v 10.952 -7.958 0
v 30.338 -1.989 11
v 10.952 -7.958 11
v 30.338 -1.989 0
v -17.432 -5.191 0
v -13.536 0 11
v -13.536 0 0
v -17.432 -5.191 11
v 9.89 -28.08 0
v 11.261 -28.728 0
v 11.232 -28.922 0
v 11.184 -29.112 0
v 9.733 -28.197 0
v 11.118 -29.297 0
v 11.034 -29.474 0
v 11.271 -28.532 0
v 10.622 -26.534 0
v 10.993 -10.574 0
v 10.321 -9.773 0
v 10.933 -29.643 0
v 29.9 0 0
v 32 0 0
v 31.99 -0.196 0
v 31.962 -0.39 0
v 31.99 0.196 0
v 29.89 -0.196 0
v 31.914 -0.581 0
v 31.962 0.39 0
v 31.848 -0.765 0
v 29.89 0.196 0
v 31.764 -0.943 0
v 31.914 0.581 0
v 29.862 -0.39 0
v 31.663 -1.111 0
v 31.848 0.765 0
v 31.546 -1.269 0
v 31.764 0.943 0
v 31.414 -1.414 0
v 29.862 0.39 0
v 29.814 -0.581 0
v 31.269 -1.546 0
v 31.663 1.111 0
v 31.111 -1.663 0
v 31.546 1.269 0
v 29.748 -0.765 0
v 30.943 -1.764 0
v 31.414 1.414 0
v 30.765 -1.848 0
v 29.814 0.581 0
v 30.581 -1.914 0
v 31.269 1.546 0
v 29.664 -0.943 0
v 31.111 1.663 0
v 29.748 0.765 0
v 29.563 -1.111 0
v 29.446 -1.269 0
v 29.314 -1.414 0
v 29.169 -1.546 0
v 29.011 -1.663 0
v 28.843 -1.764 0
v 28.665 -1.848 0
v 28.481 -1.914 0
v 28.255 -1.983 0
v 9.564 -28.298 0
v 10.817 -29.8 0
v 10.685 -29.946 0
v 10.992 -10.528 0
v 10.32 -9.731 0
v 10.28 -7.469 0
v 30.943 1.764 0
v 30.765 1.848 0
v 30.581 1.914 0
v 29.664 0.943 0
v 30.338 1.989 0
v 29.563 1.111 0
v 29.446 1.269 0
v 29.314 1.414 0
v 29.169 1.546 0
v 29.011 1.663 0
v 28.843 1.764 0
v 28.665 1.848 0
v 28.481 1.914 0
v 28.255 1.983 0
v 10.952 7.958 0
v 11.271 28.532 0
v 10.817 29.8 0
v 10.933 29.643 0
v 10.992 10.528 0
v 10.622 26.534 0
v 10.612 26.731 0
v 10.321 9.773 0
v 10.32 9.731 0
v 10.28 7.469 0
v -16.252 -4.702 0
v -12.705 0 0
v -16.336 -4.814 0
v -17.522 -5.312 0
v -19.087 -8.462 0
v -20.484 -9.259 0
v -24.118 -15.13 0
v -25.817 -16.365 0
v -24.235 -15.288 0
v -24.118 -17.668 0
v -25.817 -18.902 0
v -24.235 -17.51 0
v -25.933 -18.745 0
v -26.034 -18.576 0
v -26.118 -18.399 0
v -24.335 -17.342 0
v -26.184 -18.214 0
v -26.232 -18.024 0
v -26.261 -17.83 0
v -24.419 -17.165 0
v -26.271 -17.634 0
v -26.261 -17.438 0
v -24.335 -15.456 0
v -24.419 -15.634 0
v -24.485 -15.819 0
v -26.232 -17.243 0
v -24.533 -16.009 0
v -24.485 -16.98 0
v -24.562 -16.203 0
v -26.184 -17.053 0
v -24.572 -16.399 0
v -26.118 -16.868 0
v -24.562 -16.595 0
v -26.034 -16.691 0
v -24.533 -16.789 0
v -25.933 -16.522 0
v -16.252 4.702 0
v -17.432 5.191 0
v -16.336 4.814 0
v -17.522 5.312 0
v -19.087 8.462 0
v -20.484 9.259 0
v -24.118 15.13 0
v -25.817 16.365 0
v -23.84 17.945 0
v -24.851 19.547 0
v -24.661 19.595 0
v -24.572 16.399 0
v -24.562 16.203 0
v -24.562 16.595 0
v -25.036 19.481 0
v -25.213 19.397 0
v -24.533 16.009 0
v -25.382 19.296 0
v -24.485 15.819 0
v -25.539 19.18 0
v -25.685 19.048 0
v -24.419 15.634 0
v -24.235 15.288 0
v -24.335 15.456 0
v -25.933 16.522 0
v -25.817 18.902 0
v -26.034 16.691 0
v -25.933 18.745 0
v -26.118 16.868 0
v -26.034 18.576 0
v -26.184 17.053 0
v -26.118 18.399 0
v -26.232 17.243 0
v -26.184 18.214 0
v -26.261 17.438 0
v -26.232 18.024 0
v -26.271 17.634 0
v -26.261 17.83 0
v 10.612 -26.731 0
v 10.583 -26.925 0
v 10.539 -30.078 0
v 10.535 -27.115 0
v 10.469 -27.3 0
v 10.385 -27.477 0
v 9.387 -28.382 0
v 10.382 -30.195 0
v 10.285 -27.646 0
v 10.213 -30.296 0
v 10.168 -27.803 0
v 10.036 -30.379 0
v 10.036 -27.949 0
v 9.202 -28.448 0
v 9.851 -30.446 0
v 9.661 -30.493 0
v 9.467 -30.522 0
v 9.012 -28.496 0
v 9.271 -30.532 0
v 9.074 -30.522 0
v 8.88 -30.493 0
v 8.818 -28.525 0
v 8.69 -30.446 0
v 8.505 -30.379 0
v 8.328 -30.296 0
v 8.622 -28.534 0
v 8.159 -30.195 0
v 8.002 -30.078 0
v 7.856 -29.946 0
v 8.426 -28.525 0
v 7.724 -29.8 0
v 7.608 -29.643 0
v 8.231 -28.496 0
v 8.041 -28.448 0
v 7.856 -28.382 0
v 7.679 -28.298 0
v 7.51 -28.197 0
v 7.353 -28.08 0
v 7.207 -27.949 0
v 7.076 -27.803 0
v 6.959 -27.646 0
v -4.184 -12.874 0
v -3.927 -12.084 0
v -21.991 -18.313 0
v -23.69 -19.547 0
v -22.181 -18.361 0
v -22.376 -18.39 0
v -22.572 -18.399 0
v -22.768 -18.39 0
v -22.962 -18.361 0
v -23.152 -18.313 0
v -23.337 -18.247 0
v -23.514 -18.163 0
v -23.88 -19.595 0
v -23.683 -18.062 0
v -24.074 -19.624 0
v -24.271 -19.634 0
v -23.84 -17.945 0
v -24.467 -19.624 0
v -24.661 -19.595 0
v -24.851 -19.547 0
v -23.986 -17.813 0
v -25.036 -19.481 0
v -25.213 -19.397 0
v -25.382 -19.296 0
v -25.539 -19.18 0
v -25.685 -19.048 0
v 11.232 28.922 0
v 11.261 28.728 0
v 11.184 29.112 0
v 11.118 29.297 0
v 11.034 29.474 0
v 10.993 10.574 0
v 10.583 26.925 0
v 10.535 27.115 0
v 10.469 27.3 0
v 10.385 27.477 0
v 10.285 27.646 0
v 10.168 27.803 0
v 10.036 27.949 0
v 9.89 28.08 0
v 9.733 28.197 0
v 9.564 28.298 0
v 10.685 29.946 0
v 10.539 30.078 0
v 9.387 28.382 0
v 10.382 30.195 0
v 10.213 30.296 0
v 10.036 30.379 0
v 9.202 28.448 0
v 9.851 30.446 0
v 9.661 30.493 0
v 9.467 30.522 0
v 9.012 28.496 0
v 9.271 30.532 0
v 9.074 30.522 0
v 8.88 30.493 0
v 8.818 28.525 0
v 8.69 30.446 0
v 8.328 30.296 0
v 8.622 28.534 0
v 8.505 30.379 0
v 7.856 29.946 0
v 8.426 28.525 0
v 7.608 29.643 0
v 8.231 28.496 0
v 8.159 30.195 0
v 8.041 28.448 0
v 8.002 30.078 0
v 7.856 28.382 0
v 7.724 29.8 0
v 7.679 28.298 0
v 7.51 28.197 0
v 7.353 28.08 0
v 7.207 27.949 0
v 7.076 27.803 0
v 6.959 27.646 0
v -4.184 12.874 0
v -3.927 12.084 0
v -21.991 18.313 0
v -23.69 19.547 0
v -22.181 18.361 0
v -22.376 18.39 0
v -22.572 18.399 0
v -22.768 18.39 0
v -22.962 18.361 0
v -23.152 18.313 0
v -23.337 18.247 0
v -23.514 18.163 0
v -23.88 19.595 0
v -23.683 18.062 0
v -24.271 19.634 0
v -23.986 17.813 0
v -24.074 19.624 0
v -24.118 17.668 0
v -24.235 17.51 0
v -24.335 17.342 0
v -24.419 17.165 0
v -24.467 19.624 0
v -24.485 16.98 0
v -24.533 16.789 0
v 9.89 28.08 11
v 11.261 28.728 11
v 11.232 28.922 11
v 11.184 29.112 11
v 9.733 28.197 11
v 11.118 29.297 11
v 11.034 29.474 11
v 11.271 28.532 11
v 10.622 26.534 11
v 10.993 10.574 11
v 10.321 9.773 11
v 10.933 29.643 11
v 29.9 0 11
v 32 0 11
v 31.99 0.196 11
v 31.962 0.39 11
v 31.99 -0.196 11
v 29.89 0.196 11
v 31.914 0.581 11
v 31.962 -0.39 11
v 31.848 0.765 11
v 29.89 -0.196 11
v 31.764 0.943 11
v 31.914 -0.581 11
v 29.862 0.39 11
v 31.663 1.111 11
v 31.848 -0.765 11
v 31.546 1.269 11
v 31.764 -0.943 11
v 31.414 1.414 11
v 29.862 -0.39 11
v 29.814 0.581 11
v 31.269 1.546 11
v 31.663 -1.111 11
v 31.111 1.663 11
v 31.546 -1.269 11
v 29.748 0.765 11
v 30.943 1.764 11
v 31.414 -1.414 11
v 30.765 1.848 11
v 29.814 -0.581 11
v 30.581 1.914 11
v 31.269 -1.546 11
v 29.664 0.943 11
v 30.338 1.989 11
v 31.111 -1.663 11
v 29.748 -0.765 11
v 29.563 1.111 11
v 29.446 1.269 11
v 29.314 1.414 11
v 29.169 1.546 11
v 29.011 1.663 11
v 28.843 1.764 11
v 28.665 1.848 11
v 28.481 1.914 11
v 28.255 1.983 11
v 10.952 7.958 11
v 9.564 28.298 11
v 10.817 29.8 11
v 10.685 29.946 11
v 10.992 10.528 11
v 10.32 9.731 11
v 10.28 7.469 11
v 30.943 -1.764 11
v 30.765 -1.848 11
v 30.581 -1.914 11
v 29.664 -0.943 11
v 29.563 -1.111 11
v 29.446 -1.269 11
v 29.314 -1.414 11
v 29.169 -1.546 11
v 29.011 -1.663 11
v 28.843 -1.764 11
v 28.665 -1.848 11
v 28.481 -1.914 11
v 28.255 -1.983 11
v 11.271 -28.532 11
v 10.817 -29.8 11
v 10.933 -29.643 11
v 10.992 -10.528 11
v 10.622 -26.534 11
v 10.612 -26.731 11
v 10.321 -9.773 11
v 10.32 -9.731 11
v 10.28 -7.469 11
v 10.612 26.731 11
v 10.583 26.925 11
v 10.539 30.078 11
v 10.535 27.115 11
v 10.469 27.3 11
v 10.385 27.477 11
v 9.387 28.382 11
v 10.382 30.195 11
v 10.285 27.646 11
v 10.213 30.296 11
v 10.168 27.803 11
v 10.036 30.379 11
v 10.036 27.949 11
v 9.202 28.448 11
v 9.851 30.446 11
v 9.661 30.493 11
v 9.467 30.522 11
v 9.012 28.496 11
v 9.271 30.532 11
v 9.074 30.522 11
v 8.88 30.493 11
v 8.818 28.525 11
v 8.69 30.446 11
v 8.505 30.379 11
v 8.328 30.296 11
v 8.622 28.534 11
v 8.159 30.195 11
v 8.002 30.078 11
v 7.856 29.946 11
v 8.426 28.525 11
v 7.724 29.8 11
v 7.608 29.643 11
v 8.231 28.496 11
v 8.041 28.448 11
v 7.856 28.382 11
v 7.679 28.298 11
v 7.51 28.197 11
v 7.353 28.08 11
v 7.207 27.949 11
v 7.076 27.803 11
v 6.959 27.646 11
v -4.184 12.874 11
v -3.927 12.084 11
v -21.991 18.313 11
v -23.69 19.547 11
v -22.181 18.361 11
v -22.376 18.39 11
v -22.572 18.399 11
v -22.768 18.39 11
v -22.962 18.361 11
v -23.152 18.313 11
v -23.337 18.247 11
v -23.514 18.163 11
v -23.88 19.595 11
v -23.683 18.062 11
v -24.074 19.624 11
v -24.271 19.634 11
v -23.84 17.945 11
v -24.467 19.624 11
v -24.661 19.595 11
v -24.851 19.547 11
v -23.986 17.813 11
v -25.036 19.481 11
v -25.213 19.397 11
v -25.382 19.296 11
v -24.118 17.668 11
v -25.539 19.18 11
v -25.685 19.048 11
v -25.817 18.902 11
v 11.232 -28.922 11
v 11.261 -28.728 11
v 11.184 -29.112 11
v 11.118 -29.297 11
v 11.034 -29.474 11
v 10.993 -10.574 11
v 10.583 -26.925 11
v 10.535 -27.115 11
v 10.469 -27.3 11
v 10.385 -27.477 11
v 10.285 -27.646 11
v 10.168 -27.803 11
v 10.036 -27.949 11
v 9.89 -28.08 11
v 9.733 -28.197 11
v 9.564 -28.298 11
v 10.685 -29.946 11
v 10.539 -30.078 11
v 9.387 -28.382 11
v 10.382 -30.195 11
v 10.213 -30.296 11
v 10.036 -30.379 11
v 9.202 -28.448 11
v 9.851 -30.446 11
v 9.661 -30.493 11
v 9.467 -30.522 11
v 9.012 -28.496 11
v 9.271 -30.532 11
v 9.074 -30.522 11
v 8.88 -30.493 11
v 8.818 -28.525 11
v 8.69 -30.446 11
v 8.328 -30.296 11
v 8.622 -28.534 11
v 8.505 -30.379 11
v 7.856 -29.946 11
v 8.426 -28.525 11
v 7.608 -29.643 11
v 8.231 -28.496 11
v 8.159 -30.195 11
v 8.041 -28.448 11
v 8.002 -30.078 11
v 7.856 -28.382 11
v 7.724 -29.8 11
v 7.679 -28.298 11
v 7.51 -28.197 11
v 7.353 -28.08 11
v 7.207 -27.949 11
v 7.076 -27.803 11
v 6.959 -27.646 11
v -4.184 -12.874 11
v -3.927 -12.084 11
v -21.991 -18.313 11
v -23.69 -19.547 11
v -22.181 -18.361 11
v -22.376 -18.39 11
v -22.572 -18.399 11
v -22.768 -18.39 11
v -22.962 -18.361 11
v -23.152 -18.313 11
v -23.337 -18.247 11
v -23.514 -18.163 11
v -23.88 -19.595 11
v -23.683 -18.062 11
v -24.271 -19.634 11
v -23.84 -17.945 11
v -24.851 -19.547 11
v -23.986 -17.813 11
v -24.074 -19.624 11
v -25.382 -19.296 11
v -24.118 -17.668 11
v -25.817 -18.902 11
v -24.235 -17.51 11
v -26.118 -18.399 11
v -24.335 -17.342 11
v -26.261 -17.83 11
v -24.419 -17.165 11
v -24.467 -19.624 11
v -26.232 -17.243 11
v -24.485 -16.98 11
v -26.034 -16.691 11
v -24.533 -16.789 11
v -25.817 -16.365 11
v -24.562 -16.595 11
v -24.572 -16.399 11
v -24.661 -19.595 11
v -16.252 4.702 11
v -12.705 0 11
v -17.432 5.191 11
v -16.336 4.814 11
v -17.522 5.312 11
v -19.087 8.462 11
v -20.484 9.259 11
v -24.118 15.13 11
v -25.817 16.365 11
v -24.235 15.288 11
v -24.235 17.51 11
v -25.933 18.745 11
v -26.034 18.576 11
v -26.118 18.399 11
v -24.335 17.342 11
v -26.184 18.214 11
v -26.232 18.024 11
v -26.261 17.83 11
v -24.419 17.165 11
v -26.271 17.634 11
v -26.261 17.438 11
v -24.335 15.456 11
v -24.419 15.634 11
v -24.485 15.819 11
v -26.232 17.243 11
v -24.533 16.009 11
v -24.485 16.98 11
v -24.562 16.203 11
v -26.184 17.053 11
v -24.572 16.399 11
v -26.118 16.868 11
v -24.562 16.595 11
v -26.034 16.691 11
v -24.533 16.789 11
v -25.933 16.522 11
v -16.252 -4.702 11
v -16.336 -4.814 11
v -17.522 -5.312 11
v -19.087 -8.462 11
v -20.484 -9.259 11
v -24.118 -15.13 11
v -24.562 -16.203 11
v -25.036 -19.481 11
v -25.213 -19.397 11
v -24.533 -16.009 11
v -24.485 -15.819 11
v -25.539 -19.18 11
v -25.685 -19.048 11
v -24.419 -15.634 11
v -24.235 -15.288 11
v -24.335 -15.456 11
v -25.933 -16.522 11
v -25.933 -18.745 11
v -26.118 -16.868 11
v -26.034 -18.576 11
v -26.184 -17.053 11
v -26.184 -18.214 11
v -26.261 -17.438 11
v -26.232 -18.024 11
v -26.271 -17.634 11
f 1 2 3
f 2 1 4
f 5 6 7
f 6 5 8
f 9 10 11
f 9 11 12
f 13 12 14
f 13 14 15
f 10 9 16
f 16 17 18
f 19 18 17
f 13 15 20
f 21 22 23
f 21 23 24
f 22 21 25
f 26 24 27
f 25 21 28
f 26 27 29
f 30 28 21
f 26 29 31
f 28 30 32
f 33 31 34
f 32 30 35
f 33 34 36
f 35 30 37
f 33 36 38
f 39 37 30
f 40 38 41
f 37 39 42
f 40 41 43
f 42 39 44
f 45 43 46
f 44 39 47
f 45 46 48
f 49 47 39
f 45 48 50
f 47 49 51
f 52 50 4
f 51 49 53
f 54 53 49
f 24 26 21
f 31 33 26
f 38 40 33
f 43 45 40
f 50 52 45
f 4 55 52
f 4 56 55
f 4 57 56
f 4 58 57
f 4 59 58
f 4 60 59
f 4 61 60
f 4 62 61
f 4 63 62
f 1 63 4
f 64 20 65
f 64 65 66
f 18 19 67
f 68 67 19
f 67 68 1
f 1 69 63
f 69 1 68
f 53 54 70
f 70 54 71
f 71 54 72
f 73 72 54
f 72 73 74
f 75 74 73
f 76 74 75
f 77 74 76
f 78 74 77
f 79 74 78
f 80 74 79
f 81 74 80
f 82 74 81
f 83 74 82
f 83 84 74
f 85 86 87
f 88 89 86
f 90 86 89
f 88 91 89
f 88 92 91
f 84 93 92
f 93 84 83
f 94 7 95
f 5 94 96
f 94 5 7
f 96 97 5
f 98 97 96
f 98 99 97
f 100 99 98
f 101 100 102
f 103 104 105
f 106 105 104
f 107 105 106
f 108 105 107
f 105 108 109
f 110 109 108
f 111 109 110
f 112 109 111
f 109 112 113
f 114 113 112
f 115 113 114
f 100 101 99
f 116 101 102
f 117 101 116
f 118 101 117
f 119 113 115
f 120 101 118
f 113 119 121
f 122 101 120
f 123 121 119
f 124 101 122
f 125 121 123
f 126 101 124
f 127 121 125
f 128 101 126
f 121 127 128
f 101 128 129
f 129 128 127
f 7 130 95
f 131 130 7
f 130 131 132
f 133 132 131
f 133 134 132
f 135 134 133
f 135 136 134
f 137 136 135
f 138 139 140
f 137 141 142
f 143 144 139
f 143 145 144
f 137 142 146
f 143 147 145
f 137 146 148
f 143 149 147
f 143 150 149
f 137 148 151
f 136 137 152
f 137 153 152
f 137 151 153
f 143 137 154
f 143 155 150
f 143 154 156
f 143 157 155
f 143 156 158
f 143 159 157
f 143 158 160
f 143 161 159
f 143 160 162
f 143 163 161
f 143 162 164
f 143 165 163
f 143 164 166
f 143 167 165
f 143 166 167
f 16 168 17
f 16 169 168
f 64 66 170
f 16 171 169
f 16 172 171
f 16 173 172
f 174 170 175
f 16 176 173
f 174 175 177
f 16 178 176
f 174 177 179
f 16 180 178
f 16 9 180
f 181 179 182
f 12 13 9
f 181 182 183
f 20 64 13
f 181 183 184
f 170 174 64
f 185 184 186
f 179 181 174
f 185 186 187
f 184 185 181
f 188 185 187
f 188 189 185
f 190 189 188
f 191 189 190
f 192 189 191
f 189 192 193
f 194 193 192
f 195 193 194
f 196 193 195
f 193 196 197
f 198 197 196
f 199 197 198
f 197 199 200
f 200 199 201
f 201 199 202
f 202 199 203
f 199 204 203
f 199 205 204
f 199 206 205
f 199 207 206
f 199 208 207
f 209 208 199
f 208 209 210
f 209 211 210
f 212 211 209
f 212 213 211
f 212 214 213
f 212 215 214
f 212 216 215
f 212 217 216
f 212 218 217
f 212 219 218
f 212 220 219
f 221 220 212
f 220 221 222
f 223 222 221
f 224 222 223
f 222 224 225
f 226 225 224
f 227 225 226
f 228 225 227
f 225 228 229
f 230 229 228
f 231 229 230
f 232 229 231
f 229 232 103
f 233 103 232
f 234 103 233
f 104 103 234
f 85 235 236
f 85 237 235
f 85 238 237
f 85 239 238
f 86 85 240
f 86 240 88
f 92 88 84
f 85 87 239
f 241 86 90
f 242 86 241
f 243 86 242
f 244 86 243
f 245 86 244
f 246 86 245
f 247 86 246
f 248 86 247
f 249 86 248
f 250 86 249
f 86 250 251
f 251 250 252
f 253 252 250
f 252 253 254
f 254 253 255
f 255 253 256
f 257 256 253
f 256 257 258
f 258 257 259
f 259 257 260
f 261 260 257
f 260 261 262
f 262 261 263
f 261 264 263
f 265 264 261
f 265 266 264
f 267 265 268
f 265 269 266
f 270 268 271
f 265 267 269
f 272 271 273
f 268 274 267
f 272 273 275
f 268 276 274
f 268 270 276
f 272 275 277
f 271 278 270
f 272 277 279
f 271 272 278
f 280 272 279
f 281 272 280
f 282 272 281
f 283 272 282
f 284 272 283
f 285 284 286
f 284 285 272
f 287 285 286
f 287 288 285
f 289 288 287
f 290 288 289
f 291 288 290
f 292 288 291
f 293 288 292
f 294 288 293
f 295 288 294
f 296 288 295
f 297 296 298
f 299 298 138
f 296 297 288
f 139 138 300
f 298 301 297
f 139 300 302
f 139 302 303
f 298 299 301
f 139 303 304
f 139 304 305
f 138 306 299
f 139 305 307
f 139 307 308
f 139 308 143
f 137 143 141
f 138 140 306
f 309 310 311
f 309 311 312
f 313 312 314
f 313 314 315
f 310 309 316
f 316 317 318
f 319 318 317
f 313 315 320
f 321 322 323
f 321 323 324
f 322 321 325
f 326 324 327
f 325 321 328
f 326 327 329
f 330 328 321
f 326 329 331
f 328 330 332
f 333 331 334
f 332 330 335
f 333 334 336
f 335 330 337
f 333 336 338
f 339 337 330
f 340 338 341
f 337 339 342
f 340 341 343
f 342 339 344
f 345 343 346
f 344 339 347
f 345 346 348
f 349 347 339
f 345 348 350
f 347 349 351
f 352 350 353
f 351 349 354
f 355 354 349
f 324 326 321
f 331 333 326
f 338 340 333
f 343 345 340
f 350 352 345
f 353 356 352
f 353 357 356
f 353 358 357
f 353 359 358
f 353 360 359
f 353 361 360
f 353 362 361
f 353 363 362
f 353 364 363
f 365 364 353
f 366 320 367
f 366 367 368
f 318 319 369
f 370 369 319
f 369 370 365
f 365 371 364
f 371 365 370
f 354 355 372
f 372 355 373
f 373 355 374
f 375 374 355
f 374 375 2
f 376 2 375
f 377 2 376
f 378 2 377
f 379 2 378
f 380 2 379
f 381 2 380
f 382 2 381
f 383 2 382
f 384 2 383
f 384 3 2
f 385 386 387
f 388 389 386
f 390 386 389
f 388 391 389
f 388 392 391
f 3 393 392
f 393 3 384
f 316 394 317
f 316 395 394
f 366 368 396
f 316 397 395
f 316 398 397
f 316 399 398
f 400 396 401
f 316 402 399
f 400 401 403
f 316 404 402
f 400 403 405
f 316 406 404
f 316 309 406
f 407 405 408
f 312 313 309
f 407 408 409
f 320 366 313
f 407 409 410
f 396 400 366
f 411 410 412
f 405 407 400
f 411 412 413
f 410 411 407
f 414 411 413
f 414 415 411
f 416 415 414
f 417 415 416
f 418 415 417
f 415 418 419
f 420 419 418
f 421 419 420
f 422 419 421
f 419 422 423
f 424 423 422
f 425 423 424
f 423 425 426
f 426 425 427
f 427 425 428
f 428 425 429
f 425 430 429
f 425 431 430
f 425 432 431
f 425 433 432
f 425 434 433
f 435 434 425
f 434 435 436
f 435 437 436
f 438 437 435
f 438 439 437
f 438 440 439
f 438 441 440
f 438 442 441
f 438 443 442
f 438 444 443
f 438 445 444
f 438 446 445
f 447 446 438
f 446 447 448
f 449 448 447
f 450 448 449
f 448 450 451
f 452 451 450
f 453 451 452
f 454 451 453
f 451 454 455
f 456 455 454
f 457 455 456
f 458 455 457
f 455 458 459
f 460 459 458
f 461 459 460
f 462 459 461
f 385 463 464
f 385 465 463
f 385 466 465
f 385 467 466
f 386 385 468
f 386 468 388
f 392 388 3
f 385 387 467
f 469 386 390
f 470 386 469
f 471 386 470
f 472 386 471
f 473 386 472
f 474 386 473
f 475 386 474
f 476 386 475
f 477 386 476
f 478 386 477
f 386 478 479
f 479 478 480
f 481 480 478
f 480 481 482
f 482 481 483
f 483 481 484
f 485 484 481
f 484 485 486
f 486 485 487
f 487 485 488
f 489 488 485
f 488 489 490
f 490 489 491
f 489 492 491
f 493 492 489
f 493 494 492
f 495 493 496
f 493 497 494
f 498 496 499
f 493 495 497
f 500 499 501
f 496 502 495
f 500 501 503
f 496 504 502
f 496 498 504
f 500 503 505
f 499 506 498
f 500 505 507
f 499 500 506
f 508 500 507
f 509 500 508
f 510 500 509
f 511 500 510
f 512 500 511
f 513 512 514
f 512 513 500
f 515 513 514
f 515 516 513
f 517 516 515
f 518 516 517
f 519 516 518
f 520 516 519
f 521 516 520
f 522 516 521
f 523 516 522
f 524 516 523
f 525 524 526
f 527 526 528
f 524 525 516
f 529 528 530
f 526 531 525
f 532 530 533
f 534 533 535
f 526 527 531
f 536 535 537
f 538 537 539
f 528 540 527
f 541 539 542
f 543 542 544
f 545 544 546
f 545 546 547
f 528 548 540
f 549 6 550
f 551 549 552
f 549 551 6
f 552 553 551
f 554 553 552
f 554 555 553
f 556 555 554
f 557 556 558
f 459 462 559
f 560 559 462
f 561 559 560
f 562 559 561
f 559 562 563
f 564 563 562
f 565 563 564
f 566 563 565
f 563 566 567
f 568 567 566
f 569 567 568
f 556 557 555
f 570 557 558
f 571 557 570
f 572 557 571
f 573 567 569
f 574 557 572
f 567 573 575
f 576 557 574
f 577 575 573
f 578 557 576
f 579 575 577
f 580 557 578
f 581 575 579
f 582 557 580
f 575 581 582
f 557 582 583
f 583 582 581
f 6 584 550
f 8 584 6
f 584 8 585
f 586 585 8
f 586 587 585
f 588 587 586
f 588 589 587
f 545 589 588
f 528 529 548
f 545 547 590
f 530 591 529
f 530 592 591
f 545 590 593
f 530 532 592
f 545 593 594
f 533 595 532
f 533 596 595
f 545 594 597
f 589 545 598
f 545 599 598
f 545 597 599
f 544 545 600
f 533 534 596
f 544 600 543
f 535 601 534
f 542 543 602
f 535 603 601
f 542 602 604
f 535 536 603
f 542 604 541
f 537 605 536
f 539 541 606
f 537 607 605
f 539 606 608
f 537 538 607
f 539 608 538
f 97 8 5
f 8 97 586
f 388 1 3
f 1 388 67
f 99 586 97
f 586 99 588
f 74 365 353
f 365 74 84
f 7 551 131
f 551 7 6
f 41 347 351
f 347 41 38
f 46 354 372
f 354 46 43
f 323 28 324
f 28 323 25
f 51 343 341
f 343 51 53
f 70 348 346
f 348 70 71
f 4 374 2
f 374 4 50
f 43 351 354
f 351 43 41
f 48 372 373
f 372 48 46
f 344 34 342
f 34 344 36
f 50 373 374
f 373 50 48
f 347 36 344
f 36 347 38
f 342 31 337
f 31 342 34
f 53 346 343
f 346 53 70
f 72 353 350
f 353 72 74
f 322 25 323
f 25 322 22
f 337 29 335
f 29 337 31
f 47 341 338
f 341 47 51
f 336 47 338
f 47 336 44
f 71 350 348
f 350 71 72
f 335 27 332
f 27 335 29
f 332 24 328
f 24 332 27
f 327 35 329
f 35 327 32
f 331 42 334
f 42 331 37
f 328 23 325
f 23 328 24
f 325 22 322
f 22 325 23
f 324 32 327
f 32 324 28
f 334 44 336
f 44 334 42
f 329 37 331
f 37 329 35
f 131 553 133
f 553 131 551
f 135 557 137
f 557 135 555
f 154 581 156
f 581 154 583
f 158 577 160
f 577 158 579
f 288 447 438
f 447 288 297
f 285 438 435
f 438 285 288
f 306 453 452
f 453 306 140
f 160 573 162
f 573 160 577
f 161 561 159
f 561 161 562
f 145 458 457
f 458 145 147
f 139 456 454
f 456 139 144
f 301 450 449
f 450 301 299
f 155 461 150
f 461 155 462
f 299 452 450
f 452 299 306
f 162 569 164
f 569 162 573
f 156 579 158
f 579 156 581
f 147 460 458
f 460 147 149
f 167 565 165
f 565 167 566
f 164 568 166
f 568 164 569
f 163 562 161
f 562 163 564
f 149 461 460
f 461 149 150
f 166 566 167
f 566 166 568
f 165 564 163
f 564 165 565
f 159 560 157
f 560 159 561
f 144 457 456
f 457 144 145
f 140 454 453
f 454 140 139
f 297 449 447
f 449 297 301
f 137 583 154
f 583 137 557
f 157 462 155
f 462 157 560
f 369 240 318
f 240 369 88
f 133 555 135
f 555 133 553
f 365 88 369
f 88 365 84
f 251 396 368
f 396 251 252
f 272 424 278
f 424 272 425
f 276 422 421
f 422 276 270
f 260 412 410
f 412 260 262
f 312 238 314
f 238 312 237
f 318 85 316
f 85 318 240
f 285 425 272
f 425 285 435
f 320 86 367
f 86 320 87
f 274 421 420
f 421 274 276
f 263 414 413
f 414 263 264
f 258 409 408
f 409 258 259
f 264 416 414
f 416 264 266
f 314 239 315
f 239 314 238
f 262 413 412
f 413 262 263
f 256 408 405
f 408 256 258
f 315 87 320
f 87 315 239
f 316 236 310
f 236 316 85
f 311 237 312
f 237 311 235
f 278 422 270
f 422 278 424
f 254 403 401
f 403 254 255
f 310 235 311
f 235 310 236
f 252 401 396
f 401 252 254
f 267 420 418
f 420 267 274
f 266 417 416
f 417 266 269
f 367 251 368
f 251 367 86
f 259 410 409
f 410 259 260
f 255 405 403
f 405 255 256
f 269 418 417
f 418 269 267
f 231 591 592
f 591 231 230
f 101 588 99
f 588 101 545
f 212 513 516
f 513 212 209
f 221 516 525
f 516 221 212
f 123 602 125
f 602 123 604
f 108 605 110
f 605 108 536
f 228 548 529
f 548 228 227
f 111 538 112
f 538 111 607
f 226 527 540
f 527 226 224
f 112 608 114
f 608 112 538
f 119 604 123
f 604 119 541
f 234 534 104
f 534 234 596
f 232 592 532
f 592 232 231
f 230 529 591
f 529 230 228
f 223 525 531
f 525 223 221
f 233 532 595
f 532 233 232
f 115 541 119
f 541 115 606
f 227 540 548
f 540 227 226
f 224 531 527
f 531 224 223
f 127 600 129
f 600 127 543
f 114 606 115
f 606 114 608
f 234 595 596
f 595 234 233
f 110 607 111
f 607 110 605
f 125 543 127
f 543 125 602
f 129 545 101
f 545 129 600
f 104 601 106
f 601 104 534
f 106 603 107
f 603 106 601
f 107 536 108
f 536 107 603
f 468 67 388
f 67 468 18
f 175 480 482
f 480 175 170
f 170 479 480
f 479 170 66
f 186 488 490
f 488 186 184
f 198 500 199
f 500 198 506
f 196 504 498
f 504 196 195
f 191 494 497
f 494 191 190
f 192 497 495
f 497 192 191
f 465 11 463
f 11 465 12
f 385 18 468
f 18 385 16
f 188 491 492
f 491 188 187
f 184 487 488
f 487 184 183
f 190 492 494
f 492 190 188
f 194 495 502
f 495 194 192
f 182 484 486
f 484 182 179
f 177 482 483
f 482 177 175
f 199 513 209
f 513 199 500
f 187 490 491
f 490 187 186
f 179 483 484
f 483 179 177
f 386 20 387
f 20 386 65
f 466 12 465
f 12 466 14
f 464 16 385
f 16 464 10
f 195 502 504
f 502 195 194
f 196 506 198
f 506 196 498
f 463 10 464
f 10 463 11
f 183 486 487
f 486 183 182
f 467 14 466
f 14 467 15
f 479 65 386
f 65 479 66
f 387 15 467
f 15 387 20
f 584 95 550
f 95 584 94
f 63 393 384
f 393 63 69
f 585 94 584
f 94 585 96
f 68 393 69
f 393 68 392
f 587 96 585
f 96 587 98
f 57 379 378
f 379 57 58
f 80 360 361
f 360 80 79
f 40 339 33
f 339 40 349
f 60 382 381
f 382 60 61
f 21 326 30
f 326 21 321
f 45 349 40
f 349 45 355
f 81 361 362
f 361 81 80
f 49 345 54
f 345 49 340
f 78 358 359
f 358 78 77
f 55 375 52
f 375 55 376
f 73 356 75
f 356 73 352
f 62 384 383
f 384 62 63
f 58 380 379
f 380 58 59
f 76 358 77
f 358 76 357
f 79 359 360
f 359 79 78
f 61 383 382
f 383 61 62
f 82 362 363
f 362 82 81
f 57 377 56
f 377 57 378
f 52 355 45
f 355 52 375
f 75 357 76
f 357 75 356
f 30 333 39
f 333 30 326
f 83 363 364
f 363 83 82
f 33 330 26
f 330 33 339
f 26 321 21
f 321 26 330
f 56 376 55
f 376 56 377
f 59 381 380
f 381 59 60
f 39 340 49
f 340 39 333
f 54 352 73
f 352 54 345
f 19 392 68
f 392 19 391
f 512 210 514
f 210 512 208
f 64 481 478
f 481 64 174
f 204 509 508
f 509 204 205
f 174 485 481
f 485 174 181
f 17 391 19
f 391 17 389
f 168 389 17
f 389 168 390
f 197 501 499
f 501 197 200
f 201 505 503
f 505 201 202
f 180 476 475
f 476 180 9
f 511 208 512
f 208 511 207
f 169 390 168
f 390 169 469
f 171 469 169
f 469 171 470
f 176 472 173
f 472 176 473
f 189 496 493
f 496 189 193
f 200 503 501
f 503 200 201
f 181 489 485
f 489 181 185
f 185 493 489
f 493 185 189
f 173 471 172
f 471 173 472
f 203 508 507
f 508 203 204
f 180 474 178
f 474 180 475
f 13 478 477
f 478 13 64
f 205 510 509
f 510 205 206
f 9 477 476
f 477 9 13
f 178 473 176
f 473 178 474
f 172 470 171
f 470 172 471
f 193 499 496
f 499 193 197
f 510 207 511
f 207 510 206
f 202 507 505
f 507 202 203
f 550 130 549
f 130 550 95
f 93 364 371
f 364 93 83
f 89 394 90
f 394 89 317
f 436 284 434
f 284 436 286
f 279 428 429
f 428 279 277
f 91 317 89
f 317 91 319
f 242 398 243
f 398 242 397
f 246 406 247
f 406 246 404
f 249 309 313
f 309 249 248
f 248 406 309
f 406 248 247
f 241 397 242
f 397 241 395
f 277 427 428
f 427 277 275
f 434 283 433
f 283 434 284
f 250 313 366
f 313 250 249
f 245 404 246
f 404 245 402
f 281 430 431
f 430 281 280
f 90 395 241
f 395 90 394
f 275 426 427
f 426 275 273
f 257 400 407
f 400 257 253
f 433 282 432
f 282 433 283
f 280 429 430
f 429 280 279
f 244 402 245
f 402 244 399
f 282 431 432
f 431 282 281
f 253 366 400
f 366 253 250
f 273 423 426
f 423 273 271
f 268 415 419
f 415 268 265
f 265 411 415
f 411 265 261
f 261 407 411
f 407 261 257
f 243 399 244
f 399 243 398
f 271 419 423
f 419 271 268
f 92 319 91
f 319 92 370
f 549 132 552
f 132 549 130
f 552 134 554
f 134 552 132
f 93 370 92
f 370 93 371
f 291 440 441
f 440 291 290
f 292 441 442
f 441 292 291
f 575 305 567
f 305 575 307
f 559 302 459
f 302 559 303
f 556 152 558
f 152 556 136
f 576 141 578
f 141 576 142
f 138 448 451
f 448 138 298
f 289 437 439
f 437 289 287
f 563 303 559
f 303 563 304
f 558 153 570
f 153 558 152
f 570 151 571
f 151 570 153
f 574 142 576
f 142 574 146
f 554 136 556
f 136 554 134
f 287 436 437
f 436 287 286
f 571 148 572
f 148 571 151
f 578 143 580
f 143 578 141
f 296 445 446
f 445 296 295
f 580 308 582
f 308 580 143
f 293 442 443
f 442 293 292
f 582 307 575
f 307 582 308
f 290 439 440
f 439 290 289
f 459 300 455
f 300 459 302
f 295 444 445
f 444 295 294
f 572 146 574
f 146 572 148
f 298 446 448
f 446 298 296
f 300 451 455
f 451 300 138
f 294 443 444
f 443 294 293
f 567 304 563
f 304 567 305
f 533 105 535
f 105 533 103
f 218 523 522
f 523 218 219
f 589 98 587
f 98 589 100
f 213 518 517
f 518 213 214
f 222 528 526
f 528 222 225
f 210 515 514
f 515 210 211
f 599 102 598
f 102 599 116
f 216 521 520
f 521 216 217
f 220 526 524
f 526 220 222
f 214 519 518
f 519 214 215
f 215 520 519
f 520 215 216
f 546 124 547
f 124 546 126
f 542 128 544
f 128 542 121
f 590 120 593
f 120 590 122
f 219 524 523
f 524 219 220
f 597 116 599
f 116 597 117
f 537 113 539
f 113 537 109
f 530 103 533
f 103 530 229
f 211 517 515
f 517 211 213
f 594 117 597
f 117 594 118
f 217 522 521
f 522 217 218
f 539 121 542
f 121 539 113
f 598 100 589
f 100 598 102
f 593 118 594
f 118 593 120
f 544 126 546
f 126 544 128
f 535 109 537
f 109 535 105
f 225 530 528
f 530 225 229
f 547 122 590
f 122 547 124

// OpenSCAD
// file: ../parametric_star/parametric_star.scad
//-- Parametric star
//-- (c)  2010 Juan Gonzalez-Gomez (Obijuan) juan@iearobotics.com
//-- GPL license

//-- The 2*N points of an N-ponted star are calculated as follows:
//-- There are two circunferences:  the inner and outer.  Outer points are located
//-- at angles: 0, 360/N, 360*2/N and on the outer circunference
//-- The inner points have the same angular distance but they are 360/(2*N) rotated
//-- respect to the outers. They are located on the inner circunference

//--- INPUT PARAMETERS:
//--- N: Number of points
//--  h: Height
//-- ri: Inner radius
//-- ro: outer radius
module parametric_star(N=5, h=3, ri=15, re=30) {

  //-- Calculate and draw a 2D tip of the star
 //-- INPUT:
 //-- n: Number of the tip (from 0 to N-1)
  module tipstar(n) {
     i1 =  [ri*cos(-360*n/N+360/(N*2)), ri*sin(-360*n/N+360/(N*2))];
    e1 = [re*cos(-360*n/N), re*sin(-360*n/N)];
    i2 = [ri*cos(-360*(n+1)/N+360/(N*2)), ri*sin(-360*(n+1)/N+360/(N*2))];
    polygon([ i1, e1, i2]);
  }

  //-- Draw the 2D star and extrude

   //-- The star is the union of N 2D tips.
   //-- A inner cylinder is also needed for filling
   //-- A flat (2D) star is built. The it is extruded
    linear_extrude(height=h)
    union() {
      for (i=[0:N-1]) {
         tipstar(i);
      }
      rotate([0,0,360/(2*N)]) circle(r=ri+ri*0.01,$fn=N);
    }
}

//-- Example
parametric_star(N=5, ri=15/2,re=15);
// main file
//-- 5-pointed star
//-- (c)  2010 Juan Gonzalez-Gomez (Obijuan) juan@iearobotics.com
//-- GPL license
use <../parametric_star/parametric_star.scad>
$fn=64;

module star(r=15, wall=.1, h=10) {
        minkowski() {
            parametric_star(ri=r/2.718-wall, re=r-wall, h=h);
            cylinder(r=2);
        }
}

difference() {
    star(r=30, wall=0);
    star(r=28);
}
